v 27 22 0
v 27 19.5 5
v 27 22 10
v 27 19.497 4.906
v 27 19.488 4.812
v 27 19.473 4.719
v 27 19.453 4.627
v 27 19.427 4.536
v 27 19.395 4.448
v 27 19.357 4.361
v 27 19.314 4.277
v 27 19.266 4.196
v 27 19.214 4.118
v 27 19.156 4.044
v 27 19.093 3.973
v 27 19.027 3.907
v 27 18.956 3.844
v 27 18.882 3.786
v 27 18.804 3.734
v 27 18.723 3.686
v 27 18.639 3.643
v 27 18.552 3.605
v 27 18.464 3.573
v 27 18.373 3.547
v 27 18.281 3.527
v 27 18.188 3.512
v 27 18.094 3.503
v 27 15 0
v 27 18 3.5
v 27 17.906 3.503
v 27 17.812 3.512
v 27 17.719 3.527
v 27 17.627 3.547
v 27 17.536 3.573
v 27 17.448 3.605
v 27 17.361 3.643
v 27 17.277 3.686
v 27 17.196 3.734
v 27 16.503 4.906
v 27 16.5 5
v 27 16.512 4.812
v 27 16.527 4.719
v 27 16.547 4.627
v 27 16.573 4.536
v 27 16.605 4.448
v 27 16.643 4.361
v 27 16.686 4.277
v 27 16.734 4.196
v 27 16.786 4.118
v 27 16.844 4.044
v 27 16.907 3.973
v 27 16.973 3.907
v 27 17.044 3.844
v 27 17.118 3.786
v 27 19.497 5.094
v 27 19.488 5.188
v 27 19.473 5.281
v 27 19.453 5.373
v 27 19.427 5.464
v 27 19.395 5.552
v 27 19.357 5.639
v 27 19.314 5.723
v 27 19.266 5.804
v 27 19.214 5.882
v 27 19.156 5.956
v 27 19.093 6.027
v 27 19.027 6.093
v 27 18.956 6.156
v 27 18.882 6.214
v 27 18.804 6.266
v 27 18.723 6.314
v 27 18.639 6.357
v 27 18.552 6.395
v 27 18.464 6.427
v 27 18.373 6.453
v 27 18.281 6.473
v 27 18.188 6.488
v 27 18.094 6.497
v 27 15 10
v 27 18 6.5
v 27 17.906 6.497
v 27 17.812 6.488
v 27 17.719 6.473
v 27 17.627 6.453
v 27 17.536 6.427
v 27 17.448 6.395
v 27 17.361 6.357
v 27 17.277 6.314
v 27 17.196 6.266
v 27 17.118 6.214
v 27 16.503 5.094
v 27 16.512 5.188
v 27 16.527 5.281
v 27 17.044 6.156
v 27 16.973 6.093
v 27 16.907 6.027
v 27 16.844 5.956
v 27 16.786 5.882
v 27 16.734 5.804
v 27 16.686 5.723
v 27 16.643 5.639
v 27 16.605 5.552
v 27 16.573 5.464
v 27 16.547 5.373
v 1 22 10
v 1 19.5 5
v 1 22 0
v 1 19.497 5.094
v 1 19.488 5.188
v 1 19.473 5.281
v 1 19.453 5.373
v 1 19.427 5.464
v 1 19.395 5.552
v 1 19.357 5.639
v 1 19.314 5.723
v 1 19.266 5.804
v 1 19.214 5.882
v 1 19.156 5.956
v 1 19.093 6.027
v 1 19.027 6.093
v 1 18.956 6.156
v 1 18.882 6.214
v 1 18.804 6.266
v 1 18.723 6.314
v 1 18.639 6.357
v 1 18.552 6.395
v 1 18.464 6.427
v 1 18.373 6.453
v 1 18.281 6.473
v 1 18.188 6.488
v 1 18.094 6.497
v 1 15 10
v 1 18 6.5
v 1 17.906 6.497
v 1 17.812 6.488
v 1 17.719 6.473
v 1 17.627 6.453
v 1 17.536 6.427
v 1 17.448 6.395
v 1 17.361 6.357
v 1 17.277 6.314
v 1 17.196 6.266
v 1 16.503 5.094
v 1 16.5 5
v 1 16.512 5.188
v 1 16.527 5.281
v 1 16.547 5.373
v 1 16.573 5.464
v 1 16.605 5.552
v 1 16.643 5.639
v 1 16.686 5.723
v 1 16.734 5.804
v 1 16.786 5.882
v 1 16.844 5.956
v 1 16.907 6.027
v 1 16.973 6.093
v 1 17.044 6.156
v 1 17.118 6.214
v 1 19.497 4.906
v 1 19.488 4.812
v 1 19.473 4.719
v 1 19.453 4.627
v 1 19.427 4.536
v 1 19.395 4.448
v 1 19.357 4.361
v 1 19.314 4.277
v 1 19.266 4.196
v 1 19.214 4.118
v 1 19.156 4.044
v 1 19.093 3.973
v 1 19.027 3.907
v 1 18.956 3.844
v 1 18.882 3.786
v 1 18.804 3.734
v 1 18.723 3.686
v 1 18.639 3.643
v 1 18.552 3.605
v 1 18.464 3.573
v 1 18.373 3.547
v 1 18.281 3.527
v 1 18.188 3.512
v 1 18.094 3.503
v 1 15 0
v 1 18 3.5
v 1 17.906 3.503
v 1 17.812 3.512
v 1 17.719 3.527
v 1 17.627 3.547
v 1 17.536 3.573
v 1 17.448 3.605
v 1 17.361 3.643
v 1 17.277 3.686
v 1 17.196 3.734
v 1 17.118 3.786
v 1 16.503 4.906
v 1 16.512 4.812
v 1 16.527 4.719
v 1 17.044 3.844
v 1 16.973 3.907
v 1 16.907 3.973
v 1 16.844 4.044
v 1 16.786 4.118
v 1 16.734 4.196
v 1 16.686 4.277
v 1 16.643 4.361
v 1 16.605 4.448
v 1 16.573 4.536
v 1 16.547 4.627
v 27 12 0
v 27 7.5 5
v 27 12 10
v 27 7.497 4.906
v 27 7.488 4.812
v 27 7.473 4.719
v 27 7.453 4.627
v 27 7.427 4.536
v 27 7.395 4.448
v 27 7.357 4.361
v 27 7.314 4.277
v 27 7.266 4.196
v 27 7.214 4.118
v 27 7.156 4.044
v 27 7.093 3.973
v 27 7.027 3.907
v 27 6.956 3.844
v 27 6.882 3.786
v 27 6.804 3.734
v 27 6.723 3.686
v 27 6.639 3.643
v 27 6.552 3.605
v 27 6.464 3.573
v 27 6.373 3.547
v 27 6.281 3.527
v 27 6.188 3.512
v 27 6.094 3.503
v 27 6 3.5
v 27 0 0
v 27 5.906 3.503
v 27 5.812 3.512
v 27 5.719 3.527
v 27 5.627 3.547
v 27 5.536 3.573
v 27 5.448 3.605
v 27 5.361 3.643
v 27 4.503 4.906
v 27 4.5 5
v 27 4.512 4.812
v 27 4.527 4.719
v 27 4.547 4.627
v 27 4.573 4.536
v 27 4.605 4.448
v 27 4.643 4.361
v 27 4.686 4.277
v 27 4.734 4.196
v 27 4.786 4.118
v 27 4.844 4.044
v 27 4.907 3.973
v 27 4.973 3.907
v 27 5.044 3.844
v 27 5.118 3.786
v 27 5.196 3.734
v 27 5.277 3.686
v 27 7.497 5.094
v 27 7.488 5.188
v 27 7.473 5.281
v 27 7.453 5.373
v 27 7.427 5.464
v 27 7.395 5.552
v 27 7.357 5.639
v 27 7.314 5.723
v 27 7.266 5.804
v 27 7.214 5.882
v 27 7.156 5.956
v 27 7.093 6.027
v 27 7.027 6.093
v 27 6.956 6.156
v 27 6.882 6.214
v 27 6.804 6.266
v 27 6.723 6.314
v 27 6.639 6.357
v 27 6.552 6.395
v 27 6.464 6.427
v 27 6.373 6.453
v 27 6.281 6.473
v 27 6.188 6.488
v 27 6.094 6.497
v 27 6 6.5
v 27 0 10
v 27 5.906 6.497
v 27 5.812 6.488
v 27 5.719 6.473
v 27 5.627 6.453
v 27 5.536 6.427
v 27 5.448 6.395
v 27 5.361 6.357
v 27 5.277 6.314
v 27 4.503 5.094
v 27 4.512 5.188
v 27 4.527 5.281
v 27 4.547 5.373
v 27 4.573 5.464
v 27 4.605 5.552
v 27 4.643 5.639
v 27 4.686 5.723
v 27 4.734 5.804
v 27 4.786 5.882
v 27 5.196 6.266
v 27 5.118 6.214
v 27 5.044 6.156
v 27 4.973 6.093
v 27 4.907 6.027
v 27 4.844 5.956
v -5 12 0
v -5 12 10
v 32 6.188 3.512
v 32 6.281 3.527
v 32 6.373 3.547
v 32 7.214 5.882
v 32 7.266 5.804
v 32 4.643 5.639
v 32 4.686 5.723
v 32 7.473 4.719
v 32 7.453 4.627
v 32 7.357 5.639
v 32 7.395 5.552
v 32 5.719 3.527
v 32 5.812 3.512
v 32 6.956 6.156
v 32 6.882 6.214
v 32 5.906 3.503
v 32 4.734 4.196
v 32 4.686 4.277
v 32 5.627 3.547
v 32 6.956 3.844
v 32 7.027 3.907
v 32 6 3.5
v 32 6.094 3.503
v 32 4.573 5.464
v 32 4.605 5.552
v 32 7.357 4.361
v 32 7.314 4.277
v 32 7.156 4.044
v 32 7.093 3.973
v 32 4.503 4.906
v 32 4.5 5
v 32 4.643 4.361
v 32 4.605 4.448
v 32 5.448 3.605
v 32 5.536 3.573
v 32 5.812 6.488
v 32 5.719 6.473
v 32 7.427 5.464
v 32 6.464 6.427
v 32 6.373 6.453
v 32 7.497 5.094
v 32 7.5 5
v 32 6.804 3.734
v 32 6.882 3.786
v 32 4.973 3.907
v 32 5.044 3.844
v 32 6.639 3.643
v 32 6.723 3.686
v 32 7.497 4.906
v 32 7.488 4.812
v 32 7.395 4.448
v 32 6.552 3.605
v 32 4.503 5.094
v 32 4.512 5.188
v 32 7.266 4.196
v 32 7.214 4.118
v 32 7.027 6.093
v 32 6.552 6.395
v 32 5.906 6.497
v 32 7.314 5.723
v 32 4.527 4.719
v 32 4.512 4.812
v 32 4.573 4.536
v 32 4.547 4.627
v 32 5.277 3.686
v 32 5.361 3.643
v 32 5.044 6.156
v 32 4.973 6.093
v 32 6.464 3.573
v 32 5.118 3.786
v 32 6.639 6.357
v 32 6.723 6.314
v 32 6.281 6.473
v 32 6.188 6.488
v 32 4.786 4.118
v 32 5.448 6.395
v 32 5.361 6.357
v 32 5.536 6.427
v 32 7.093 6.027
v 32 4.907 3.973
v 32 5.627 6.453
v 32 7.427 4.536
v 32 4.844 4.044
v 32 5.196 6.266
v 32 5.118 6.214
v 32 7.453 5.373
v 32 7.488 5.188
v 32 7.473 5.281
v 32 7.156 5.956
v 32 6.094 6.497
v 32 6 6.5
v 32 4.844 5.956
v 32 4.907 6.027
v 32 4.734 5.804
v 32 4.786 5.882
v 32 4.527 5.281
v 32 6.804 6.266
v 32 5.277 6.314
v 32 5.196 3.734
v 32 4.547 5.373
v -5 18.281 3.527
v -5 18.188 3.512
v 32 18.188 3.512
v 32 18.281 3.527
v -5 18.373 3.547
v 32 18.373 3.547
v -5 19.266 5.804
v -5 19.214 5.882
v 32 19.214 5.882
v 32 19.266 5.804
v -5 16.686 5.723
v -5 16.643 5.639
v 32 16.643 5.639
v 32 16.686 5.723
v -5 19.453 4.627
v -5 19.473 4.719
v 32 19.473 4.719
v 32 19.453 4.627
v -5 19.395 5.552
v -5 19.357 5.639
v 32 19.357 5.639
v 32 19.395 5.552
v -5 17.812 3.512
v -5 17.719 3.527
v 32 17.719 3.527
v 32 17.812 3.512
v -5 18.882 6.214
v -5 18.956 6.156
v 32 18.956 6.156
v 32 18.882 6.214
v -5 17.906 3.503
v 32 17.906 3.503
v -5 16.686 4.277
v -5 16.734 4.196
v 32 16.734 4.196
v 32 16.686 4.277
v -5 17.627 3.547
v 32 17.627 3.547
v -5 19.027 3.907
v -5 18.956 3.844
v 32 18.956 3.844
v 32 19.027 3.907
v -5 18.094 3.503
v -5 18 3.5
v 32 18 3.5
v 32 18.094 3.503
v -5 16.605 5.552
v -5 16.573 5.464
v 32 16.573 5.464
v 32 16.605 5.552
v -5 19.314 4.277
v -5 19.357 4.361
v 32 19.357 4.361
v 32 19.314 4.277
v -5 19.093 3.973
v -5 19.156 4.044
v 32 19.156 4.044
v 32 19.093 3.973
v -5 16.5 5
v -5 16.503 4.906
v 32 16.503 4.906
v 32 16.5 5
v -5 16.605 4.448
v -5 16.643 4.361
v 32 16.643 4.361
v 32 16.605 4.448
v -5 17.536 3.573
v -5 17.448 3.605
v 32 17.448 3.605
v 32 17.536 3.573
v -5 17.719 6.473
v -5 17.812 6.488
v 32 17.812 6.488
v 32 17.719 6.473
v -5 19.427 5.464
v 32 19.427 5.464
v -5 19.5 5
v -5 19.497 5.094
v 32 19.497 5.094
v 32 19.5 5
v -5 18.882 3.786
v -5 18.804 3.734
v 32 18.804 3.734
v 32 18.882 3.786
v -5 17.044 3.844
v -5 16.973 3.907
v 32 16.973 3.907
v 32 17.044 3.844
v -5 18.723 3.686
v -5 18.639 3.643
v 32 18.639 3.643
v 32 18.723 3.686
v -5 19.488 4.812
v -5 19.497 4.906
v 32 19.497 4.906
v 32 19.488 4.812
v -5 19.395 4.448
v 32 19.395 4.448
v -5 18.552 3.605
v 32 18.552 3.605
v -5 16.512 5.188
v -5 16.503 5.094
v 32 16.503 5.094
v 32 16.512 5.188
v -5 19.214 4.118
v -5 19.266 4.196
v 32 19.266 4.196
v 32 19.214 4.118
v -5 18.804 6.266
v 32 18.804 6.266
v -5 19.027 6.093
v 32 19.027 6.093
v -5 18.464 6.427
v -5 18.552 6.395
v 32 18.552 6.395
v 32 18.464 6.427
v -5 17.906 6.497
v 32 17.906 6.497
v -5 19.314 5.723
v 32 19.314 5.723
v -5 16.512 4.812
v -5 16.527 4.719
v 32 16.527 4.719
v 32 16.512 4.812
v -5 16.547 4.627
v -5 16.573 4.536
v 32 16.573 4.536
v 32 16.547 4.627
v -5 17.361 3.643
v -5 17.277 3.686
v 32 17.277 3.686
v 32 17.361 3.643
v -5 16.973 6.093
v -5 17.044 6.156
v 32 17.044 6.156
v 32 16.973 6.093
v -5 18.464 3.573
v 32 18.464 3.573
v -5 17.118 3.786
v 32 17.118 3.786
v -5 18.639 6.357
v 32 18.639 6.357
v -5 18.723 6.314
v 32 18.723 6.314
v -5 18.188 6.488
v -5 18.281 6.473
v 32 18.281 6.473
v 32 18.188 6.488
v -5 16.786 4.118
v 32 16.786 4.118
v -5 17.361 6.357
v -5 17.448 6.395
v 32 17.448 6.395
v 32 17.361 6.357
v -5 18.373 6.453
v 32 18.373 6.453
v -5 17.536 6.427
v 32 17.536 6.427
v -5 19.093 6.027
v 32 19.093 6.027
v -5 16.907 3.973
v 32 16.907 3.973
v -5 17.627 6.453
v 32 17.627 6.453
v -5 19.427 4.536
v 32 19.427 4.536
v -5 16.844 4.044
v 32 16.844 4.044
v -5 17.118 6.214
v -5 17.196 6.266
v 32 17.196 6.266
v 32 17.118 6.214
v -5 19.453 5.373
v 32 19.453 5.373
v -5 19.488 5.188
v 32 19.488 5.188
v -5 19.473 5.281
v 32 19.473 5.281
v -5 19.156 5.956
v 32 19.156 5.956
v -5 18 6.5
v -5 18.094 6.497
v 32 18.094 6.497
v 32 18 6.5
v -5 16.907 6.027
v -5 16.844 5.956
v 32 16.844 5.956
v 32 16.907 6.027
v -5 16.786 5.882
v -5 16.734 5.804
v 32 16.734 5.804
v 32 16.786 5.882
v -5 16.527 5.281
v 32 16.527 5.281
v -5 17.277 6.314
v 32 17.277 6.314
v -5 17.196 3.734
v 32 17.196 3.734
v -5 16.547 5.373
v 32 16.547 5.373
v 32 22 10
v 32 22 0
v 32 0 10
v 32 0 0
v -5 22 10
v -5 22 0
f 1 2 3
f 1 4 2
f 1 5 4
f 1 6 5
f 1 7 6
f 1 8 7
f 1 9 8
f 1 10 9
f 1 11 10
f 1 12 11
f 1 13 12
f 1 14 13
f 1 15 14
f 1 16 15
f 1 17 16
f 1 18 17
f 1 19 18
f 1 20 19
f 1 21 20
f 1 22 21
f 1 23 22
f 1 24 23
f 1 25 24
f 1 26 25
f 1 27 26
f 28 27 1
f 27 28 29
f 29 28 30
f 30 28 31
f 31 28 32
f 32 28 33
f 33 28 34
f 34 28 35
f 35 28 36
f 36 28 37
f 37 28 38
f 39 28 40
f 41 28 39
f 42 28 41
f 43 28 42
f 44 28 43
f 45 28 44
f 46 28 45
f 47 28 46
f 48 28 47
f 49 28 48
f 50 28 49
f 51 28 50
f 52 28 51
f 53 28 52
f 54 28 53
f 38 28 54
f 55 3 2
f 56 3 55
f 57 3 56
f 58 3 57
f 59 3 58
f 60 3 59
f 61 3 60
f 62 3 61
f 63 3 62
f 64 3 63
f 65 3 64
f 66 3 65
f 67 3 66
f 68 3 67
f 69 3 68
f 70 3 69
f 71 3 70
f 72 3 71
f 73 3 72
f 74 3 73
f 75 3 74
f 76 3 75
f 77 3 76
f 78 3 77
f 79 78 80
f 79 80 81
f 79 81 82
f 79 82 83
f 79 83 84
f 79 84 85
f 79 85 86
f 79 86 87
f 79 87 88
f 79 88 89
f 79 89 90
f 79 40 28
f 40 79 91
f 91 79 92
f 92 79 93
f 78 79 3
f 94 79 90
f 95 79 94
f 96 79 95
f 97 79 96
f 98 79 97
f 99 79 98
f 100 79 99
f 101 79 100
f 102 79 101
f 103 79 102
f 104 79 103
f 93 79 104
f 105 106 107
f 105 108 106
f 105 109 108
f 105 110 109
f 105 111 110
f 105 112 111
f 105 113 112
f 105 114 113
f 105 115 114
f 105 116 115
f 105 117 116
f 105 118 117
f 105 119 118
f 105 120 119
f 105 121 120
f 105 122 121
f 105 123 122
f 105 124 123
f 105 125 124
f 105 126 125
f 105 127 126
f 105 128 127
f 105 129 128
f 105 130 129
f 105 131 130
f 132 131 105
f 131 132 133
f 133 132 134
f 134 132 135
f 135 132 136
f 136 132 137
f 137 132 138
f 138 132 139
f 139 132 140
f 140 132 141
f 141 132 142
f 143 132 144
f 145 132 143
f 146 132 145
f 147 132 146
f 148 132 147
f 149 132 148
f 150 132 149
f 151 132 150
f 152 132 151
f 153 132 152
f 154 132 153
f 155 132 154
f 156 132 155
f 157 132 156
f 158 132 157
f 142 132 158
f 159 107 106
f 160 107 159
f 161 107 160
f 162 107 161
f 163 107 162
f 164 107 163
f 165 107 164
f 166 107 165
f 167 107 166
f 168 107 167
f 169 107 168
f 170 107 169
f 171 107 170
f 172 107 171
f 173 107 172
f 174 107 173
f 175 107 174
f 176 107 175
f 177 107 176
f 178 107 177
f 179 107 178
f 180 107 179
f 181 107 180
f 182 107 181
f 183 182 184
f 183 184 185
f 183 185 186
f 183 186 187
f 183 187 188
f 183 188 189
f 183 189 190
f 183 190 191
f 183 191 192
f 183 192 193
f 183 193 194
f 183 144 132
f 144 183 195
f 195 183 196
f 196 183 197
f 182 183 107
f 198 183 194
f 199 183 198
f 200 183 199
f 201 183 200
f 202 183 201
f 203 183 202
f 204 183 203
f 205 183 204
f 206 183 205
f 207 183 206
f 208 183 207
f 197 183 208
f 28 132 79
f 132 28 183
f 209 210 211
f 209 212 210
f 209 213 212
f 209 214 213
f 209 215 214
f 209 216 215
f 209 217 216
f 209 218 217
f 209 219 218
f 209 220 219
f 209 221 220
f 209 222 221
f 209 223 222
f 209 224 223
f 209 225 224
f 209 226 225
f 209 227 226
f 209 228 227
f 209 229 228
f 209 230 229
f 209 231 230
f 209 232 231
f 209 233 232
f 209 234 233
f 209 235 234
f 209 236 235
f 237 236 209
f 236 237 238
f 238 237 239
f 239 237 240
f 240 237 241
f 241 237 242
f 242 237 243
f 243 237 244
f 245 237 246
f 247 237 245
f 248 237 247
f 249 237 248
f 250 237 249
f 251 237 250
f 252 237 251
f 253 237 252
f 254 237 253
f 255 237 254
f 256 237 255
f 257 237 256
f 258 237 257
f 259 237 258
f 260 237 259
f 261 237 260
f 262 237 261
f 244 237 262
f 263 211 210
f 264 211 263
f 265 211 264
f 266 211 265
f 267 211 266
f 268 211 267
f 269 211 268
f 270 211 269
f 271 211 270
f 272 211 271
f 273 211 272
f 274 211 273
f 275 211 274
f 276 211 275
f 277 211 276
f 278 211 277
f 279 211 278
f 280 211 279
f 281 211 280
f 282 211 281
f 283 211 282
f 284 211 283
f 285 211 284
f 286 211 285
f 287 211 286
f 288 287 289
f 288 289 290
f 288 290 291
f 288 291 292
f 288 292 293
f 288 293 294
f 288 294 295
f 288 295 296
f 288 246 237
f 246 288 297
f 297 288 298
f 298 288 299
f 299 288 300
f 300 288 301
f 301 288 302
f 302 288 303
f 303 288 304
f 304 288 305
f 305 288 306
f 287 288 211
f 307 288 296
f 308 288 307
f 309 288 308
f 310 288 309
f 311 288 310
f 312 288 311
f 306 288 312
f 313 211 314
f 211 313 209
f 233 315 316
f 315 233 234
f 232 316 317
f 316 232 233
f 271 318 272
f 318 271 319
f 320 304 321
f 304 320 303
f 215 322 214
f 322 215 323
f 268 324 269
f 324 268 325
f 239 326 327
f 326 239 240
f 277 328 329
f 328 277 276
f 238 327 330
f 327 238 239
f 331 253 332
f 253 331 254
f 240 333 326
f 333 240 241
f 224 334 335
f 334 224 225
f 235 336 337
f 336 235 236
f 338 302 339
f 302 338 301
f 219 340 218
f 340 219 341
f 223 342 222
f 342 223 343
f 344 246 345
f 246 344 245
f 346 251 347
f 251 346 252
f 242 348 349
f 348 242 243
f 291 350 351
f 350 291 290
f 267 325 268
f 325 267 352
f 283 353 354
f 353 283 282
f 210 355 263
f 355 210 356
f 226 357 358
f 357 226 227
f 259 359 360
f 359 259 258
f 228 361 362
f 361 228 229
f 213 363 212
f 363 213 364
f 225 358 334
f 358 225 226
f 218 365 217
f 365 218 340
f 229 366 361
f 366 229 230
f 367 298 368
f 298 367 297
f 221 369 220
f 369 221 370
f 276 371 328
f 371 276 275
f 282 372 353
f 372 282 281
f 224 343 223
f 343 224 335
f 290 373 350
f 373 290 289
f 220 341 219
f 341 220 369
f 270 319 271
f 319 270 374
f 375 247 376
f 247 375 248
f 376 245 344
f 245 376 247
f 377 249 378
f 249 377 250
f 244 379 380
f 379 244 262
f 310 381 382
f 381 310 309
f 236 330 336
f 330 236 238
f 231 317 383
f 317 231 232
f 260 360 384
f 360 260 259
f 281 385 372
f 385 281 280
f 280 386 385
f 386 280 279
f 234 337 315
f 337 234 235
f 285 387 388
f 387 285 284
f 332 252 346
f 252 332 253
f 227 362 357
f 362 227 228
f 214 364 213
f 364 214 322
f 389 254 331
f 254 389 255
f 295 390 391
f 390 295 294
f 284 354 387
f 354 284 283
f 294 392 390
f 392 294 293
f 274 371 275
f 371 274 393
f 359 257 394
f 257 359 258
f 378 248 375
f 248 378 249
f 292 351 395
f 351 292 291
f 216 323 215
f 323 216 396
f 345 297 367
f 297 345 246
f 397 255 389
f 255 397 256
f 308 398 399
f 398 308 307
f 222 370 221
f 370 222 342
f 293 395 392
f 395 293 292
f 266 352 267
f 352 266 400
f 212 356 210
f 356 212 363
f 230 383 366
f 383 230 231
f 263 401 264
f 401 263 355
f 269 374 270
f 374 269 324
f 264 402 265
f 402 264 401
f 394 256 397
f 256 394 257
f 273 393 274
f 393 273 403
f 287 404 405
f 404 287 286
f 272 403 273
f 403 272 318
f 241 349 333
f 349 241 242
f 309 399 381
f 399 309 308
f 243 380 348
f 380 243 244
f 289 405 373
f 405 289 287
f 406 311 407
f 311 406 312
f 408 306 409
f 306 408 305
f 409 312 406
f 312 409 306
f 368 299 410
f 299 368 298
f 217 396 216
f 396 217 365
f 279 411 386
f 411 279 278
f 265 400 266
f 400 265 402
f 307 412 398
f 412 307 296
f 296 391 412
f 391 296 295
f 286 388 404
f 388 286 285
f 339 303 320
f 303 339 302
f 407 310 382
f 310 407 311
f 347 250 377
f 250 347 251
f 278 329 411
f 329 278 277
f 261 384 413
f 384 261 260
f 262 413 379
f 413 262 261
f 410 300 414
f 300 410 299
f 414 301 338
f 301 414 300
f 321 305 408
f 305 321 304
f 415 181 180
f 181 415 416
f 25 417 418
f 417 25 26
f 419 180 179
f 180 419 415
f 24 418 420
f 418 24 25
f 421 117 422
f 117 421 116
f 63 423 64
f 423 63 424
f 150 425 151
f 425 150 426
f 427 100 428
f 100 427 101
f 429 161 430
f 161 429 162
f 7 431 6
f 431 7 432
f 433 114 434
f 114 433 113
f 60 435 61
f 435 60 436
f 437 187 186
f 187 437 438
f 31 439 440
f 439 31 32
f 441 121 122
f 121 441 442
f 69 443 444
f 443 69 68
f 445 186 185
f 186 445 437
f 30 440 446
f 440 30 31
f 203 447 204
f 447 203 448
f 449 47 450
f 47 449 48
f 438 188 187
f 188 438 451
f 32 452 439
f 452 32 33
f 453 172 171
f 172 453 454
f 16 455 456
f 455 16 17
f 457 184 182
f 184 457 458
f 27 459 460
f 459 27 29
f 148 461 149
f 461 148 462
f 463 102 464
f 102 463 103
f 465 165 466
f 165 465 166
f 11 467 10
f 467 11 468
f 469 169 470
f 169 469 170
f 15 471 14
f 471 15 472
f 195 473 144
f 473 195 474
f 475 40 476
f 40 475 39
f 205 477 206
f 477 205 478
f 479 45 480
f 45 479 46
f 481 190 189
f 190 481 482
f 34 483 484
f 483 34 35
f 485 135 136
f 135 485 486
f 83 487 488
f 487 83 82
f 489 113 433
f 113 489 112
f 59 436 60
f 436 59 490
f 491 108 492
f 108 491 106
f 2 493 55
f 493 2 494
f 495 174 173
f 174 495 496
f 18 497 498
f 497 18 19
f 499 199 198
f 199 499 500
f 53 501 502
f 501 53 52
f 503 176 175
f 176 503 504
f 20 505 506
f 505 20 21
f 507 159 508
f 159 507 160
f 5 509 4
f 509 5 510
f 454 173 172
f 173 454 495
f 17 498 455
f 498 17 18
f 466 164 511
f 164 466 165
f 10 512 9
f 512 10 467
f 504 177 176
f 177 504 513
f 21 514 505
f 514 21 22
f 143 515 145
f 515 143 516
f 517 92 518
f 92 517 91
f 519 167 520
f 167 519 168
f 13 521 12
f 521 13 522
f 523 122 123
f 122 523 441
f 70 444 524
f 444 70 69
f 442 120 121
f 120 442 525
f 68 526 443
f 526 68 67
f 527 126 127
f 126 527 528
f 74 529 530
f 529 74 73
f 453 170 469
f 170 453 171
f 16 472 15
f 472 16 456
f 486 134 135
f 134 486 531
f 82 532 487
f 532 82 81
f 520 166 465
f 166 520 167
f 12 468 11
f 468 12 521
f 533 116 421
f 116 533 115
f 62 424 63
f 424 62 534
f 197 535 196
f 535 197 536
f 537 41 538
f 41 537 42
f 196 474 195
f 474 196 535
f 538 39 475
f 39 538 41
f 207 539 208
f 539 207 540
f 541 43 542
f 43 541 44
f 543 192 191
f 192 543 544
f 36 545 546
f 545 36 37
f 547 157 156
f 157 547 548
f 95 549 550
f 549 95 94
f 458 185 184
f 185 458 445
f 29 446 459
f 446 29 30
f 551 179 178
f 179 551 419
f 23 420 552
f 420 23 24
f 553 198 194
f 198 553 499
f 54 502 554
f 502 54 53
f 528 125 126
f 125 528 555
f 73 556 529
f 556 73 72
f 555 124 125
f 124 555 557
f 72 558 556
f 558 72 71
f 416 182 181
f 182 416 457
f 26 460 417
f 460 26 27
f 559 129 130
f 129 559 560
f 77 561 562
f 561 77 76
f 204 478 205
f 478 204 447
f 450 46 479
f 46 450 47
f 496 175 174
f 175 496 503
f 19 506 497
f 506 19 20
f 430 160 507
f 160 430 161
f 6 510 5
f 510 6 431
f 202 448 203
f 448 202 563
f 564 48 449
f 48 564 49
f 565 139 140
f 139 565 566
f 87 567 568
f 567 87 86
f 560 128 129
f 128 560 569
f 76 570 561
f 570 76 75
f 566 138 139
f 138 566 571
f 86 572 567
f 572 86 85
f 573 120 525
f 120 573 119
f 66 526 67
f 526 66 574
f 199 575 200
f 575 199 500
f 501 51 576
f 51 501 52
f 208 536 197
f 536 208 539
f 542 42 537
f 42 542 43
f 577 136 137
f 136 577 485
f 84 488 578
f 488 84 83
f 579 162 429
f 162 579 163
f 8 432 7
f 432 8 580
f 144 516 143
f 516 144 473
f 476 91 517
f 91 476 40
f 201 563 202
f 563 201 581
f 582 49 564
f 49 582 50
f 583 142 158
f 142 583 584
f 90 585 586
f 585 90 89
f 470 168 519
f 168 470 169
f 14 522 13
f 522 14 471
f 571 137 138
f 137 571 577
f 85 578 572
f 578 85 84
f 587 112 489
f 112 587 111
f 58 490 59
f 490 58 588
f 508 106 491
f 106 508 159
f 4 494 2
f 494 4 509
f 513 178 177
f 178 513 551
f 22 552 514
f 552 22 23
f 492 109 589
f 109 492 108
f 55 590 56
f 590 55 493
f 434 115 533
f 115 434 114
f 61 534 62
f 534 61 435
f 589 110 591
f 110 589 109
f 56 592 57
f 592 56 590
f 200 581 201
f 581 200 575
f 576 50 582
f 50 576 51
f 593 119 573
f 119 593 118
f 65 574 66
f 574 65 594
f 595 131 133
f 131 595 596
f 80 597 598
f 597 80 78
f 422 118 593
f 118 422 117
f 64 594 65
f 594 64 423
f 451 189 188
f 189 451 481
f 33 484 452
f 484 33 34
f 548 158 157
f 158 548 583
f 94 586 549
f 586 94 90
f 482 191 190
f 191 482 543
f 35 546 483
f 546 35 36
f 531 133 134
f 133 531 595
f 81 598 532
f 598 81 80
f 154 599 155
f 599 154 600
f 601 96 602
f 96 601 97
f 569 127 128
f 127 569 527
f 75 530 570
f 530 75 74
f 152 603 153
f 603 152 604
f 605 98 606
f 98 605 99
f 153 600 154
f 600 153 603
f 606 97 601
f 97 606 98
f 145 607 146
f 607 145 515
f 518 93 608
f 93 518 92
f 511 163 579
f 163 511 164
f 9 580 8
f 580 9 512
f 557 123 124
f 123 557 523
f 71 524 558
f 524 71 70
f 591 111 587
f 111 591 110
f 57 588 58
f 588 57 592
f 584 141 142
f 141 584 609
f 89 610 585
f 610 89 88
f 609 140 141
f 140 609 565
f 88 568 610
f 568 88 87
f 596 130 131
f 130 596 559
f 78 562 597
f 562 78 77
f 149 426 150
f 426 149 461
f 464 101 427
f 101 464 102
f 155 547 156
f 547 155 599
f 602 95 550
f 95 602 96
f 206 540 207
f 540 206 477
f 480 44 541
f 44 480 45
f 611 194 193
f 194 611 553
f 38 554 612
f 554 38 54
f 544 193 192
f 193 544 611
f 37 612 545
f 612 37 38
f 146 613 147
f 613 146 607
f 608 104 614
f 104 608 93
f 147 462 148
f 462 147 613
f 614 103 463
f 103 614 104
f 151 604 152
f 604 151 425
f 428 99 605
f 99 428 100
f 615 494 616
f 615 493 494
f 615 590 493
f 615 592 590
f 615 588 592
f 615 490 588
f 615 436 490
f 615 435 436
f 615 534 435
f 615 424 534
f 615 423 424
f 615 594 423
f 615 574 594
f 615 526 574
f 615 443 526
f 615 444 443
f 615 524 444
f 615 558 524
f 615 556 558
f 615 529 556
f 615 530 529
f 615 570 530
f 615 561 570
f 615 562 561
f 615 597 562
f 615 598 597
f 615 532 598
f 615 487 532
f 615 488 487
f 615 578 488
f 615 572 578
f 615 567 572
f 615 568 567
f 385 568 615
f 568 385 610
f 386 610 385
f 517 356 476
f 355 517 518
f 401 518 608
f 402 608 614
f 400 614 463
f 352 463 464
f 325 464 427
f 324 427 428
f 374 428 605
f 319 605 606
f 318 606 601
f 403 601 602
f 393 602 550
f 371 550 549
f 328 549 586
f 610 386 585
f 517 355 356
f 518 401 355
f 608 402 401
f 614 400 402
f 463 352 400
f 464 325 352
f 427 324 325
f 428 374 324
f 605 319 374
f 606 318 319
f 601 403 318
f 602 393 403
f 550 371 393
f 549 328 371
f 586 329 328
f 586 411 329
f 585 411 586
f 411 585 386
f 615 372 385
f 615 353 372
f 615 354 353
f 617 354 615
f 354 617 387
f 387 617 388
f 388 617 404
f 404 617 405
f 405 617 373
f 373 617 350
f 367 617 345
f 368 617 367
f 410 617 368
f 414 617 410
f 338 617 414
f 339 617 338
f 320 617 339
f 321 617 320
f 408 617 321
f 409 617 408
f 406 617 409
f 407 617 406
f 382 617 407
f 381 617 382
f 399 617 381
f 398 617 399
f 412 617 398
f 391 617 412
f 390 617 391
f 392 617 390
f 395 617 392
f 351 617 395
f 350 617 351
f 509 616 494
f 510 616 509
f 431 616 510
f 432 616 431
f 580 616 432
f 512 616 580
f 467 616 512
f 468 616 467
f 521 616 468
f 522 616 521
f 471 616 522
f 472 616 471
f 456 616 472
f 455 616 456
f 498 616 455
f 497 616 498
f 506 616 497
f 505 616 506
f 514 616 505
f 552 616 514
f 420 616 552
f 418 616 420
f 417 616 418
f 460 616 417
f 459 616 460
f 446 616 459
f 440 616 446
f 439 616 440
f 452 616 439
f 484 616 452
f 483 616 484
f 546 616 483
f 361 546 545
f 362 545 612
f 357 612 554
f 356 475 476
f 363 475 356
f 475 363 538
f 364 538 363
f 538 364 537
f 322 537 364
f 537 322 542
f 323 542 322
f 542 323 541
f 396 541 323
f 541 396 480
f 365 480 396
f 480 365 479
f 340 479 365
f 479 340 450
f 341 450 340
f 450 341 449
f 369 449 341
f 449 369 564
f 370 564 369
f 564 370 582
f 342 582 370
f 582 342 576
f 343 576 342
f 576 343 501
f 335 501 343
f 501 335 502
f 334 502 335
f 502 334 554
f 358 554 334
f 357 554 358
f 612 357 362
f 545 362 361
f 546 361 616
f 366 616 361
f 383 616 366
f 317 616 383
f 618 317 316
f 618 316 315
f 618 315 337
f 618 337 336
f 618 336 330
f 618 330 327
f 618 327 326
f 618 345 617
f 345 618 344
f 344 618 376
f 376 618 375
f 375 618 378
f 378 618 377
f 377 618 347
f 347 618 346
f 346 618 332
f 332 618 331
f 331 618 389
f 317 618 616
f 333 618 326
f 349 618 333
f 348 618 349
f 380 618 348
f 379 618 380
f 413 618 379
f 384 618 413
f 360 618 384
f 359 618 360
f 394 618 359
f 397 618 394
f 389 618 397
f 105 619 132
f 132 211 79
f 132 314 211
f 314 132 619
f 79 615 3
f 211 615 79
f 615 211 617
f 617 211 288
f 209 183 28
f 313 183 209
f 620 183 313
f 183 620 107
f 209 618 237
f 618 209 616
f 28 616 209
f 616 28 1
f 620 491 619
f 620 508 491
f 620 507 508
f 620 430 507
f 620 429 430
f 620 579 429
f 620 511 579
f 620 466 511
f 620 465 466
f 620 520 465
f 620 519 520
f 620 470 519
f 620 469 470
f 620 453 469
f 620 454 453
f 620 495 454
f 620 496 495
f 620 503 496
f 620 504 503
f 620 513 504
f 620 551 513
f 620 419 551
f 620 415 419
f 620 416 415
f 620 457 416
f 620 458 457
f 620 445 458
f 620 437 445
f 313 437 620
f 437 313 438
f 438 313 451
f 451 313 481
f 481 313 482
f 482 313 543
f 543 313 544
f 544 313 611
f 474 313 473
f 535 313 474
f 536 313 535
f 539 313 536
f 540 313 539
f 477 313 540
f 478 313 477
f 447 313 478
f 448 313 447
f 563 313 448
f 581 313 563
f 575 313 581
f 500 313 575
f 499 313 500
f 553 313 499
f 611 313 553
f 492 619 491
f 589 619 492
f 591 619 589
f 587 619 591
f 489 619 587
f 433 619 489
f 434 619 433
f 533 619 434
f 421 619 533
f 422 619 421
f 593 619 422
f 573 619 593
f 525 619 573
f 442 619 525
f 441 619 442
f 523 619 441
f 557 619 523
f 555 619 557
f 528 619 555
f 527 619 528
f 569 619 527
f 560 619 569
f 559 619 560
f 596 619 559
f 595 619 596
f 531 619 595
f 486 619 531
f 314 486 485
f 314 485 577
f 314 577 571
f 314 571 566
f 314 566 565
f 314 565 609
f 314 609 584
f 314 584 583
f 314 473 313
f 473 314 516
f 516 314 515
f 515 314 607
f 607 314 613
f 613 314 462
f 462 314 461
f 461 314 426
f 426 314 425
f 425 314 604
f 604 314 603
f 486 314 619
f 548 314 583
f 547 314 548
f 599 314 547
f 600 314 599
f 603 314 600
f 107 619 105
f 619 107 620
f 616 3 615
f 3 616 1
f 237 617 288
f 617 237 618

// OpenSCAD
difference(){
	union(){ 

        translate([-5,0,0]){
           cube([37,22,10], center=false);
        }                
	}
	union() {
        translate([1,15,-1]){
           cube([26,13,15], center=false);
        }                

        translate([-10,-1,-1]){
           cube([37,13,12], center=false);
        }                

        translate([0,12-6,5]){
            rotate([0,90,0]){
                cylinder(h=200, r=1.5, $fn=100, center=true);
            }   
        }
        translate([0,12+6,5]){
            rotate([0,90,0]){
                cylinder(h=200, r=1.5, $fn=100, center=true);
            }   
        }

	}
}
